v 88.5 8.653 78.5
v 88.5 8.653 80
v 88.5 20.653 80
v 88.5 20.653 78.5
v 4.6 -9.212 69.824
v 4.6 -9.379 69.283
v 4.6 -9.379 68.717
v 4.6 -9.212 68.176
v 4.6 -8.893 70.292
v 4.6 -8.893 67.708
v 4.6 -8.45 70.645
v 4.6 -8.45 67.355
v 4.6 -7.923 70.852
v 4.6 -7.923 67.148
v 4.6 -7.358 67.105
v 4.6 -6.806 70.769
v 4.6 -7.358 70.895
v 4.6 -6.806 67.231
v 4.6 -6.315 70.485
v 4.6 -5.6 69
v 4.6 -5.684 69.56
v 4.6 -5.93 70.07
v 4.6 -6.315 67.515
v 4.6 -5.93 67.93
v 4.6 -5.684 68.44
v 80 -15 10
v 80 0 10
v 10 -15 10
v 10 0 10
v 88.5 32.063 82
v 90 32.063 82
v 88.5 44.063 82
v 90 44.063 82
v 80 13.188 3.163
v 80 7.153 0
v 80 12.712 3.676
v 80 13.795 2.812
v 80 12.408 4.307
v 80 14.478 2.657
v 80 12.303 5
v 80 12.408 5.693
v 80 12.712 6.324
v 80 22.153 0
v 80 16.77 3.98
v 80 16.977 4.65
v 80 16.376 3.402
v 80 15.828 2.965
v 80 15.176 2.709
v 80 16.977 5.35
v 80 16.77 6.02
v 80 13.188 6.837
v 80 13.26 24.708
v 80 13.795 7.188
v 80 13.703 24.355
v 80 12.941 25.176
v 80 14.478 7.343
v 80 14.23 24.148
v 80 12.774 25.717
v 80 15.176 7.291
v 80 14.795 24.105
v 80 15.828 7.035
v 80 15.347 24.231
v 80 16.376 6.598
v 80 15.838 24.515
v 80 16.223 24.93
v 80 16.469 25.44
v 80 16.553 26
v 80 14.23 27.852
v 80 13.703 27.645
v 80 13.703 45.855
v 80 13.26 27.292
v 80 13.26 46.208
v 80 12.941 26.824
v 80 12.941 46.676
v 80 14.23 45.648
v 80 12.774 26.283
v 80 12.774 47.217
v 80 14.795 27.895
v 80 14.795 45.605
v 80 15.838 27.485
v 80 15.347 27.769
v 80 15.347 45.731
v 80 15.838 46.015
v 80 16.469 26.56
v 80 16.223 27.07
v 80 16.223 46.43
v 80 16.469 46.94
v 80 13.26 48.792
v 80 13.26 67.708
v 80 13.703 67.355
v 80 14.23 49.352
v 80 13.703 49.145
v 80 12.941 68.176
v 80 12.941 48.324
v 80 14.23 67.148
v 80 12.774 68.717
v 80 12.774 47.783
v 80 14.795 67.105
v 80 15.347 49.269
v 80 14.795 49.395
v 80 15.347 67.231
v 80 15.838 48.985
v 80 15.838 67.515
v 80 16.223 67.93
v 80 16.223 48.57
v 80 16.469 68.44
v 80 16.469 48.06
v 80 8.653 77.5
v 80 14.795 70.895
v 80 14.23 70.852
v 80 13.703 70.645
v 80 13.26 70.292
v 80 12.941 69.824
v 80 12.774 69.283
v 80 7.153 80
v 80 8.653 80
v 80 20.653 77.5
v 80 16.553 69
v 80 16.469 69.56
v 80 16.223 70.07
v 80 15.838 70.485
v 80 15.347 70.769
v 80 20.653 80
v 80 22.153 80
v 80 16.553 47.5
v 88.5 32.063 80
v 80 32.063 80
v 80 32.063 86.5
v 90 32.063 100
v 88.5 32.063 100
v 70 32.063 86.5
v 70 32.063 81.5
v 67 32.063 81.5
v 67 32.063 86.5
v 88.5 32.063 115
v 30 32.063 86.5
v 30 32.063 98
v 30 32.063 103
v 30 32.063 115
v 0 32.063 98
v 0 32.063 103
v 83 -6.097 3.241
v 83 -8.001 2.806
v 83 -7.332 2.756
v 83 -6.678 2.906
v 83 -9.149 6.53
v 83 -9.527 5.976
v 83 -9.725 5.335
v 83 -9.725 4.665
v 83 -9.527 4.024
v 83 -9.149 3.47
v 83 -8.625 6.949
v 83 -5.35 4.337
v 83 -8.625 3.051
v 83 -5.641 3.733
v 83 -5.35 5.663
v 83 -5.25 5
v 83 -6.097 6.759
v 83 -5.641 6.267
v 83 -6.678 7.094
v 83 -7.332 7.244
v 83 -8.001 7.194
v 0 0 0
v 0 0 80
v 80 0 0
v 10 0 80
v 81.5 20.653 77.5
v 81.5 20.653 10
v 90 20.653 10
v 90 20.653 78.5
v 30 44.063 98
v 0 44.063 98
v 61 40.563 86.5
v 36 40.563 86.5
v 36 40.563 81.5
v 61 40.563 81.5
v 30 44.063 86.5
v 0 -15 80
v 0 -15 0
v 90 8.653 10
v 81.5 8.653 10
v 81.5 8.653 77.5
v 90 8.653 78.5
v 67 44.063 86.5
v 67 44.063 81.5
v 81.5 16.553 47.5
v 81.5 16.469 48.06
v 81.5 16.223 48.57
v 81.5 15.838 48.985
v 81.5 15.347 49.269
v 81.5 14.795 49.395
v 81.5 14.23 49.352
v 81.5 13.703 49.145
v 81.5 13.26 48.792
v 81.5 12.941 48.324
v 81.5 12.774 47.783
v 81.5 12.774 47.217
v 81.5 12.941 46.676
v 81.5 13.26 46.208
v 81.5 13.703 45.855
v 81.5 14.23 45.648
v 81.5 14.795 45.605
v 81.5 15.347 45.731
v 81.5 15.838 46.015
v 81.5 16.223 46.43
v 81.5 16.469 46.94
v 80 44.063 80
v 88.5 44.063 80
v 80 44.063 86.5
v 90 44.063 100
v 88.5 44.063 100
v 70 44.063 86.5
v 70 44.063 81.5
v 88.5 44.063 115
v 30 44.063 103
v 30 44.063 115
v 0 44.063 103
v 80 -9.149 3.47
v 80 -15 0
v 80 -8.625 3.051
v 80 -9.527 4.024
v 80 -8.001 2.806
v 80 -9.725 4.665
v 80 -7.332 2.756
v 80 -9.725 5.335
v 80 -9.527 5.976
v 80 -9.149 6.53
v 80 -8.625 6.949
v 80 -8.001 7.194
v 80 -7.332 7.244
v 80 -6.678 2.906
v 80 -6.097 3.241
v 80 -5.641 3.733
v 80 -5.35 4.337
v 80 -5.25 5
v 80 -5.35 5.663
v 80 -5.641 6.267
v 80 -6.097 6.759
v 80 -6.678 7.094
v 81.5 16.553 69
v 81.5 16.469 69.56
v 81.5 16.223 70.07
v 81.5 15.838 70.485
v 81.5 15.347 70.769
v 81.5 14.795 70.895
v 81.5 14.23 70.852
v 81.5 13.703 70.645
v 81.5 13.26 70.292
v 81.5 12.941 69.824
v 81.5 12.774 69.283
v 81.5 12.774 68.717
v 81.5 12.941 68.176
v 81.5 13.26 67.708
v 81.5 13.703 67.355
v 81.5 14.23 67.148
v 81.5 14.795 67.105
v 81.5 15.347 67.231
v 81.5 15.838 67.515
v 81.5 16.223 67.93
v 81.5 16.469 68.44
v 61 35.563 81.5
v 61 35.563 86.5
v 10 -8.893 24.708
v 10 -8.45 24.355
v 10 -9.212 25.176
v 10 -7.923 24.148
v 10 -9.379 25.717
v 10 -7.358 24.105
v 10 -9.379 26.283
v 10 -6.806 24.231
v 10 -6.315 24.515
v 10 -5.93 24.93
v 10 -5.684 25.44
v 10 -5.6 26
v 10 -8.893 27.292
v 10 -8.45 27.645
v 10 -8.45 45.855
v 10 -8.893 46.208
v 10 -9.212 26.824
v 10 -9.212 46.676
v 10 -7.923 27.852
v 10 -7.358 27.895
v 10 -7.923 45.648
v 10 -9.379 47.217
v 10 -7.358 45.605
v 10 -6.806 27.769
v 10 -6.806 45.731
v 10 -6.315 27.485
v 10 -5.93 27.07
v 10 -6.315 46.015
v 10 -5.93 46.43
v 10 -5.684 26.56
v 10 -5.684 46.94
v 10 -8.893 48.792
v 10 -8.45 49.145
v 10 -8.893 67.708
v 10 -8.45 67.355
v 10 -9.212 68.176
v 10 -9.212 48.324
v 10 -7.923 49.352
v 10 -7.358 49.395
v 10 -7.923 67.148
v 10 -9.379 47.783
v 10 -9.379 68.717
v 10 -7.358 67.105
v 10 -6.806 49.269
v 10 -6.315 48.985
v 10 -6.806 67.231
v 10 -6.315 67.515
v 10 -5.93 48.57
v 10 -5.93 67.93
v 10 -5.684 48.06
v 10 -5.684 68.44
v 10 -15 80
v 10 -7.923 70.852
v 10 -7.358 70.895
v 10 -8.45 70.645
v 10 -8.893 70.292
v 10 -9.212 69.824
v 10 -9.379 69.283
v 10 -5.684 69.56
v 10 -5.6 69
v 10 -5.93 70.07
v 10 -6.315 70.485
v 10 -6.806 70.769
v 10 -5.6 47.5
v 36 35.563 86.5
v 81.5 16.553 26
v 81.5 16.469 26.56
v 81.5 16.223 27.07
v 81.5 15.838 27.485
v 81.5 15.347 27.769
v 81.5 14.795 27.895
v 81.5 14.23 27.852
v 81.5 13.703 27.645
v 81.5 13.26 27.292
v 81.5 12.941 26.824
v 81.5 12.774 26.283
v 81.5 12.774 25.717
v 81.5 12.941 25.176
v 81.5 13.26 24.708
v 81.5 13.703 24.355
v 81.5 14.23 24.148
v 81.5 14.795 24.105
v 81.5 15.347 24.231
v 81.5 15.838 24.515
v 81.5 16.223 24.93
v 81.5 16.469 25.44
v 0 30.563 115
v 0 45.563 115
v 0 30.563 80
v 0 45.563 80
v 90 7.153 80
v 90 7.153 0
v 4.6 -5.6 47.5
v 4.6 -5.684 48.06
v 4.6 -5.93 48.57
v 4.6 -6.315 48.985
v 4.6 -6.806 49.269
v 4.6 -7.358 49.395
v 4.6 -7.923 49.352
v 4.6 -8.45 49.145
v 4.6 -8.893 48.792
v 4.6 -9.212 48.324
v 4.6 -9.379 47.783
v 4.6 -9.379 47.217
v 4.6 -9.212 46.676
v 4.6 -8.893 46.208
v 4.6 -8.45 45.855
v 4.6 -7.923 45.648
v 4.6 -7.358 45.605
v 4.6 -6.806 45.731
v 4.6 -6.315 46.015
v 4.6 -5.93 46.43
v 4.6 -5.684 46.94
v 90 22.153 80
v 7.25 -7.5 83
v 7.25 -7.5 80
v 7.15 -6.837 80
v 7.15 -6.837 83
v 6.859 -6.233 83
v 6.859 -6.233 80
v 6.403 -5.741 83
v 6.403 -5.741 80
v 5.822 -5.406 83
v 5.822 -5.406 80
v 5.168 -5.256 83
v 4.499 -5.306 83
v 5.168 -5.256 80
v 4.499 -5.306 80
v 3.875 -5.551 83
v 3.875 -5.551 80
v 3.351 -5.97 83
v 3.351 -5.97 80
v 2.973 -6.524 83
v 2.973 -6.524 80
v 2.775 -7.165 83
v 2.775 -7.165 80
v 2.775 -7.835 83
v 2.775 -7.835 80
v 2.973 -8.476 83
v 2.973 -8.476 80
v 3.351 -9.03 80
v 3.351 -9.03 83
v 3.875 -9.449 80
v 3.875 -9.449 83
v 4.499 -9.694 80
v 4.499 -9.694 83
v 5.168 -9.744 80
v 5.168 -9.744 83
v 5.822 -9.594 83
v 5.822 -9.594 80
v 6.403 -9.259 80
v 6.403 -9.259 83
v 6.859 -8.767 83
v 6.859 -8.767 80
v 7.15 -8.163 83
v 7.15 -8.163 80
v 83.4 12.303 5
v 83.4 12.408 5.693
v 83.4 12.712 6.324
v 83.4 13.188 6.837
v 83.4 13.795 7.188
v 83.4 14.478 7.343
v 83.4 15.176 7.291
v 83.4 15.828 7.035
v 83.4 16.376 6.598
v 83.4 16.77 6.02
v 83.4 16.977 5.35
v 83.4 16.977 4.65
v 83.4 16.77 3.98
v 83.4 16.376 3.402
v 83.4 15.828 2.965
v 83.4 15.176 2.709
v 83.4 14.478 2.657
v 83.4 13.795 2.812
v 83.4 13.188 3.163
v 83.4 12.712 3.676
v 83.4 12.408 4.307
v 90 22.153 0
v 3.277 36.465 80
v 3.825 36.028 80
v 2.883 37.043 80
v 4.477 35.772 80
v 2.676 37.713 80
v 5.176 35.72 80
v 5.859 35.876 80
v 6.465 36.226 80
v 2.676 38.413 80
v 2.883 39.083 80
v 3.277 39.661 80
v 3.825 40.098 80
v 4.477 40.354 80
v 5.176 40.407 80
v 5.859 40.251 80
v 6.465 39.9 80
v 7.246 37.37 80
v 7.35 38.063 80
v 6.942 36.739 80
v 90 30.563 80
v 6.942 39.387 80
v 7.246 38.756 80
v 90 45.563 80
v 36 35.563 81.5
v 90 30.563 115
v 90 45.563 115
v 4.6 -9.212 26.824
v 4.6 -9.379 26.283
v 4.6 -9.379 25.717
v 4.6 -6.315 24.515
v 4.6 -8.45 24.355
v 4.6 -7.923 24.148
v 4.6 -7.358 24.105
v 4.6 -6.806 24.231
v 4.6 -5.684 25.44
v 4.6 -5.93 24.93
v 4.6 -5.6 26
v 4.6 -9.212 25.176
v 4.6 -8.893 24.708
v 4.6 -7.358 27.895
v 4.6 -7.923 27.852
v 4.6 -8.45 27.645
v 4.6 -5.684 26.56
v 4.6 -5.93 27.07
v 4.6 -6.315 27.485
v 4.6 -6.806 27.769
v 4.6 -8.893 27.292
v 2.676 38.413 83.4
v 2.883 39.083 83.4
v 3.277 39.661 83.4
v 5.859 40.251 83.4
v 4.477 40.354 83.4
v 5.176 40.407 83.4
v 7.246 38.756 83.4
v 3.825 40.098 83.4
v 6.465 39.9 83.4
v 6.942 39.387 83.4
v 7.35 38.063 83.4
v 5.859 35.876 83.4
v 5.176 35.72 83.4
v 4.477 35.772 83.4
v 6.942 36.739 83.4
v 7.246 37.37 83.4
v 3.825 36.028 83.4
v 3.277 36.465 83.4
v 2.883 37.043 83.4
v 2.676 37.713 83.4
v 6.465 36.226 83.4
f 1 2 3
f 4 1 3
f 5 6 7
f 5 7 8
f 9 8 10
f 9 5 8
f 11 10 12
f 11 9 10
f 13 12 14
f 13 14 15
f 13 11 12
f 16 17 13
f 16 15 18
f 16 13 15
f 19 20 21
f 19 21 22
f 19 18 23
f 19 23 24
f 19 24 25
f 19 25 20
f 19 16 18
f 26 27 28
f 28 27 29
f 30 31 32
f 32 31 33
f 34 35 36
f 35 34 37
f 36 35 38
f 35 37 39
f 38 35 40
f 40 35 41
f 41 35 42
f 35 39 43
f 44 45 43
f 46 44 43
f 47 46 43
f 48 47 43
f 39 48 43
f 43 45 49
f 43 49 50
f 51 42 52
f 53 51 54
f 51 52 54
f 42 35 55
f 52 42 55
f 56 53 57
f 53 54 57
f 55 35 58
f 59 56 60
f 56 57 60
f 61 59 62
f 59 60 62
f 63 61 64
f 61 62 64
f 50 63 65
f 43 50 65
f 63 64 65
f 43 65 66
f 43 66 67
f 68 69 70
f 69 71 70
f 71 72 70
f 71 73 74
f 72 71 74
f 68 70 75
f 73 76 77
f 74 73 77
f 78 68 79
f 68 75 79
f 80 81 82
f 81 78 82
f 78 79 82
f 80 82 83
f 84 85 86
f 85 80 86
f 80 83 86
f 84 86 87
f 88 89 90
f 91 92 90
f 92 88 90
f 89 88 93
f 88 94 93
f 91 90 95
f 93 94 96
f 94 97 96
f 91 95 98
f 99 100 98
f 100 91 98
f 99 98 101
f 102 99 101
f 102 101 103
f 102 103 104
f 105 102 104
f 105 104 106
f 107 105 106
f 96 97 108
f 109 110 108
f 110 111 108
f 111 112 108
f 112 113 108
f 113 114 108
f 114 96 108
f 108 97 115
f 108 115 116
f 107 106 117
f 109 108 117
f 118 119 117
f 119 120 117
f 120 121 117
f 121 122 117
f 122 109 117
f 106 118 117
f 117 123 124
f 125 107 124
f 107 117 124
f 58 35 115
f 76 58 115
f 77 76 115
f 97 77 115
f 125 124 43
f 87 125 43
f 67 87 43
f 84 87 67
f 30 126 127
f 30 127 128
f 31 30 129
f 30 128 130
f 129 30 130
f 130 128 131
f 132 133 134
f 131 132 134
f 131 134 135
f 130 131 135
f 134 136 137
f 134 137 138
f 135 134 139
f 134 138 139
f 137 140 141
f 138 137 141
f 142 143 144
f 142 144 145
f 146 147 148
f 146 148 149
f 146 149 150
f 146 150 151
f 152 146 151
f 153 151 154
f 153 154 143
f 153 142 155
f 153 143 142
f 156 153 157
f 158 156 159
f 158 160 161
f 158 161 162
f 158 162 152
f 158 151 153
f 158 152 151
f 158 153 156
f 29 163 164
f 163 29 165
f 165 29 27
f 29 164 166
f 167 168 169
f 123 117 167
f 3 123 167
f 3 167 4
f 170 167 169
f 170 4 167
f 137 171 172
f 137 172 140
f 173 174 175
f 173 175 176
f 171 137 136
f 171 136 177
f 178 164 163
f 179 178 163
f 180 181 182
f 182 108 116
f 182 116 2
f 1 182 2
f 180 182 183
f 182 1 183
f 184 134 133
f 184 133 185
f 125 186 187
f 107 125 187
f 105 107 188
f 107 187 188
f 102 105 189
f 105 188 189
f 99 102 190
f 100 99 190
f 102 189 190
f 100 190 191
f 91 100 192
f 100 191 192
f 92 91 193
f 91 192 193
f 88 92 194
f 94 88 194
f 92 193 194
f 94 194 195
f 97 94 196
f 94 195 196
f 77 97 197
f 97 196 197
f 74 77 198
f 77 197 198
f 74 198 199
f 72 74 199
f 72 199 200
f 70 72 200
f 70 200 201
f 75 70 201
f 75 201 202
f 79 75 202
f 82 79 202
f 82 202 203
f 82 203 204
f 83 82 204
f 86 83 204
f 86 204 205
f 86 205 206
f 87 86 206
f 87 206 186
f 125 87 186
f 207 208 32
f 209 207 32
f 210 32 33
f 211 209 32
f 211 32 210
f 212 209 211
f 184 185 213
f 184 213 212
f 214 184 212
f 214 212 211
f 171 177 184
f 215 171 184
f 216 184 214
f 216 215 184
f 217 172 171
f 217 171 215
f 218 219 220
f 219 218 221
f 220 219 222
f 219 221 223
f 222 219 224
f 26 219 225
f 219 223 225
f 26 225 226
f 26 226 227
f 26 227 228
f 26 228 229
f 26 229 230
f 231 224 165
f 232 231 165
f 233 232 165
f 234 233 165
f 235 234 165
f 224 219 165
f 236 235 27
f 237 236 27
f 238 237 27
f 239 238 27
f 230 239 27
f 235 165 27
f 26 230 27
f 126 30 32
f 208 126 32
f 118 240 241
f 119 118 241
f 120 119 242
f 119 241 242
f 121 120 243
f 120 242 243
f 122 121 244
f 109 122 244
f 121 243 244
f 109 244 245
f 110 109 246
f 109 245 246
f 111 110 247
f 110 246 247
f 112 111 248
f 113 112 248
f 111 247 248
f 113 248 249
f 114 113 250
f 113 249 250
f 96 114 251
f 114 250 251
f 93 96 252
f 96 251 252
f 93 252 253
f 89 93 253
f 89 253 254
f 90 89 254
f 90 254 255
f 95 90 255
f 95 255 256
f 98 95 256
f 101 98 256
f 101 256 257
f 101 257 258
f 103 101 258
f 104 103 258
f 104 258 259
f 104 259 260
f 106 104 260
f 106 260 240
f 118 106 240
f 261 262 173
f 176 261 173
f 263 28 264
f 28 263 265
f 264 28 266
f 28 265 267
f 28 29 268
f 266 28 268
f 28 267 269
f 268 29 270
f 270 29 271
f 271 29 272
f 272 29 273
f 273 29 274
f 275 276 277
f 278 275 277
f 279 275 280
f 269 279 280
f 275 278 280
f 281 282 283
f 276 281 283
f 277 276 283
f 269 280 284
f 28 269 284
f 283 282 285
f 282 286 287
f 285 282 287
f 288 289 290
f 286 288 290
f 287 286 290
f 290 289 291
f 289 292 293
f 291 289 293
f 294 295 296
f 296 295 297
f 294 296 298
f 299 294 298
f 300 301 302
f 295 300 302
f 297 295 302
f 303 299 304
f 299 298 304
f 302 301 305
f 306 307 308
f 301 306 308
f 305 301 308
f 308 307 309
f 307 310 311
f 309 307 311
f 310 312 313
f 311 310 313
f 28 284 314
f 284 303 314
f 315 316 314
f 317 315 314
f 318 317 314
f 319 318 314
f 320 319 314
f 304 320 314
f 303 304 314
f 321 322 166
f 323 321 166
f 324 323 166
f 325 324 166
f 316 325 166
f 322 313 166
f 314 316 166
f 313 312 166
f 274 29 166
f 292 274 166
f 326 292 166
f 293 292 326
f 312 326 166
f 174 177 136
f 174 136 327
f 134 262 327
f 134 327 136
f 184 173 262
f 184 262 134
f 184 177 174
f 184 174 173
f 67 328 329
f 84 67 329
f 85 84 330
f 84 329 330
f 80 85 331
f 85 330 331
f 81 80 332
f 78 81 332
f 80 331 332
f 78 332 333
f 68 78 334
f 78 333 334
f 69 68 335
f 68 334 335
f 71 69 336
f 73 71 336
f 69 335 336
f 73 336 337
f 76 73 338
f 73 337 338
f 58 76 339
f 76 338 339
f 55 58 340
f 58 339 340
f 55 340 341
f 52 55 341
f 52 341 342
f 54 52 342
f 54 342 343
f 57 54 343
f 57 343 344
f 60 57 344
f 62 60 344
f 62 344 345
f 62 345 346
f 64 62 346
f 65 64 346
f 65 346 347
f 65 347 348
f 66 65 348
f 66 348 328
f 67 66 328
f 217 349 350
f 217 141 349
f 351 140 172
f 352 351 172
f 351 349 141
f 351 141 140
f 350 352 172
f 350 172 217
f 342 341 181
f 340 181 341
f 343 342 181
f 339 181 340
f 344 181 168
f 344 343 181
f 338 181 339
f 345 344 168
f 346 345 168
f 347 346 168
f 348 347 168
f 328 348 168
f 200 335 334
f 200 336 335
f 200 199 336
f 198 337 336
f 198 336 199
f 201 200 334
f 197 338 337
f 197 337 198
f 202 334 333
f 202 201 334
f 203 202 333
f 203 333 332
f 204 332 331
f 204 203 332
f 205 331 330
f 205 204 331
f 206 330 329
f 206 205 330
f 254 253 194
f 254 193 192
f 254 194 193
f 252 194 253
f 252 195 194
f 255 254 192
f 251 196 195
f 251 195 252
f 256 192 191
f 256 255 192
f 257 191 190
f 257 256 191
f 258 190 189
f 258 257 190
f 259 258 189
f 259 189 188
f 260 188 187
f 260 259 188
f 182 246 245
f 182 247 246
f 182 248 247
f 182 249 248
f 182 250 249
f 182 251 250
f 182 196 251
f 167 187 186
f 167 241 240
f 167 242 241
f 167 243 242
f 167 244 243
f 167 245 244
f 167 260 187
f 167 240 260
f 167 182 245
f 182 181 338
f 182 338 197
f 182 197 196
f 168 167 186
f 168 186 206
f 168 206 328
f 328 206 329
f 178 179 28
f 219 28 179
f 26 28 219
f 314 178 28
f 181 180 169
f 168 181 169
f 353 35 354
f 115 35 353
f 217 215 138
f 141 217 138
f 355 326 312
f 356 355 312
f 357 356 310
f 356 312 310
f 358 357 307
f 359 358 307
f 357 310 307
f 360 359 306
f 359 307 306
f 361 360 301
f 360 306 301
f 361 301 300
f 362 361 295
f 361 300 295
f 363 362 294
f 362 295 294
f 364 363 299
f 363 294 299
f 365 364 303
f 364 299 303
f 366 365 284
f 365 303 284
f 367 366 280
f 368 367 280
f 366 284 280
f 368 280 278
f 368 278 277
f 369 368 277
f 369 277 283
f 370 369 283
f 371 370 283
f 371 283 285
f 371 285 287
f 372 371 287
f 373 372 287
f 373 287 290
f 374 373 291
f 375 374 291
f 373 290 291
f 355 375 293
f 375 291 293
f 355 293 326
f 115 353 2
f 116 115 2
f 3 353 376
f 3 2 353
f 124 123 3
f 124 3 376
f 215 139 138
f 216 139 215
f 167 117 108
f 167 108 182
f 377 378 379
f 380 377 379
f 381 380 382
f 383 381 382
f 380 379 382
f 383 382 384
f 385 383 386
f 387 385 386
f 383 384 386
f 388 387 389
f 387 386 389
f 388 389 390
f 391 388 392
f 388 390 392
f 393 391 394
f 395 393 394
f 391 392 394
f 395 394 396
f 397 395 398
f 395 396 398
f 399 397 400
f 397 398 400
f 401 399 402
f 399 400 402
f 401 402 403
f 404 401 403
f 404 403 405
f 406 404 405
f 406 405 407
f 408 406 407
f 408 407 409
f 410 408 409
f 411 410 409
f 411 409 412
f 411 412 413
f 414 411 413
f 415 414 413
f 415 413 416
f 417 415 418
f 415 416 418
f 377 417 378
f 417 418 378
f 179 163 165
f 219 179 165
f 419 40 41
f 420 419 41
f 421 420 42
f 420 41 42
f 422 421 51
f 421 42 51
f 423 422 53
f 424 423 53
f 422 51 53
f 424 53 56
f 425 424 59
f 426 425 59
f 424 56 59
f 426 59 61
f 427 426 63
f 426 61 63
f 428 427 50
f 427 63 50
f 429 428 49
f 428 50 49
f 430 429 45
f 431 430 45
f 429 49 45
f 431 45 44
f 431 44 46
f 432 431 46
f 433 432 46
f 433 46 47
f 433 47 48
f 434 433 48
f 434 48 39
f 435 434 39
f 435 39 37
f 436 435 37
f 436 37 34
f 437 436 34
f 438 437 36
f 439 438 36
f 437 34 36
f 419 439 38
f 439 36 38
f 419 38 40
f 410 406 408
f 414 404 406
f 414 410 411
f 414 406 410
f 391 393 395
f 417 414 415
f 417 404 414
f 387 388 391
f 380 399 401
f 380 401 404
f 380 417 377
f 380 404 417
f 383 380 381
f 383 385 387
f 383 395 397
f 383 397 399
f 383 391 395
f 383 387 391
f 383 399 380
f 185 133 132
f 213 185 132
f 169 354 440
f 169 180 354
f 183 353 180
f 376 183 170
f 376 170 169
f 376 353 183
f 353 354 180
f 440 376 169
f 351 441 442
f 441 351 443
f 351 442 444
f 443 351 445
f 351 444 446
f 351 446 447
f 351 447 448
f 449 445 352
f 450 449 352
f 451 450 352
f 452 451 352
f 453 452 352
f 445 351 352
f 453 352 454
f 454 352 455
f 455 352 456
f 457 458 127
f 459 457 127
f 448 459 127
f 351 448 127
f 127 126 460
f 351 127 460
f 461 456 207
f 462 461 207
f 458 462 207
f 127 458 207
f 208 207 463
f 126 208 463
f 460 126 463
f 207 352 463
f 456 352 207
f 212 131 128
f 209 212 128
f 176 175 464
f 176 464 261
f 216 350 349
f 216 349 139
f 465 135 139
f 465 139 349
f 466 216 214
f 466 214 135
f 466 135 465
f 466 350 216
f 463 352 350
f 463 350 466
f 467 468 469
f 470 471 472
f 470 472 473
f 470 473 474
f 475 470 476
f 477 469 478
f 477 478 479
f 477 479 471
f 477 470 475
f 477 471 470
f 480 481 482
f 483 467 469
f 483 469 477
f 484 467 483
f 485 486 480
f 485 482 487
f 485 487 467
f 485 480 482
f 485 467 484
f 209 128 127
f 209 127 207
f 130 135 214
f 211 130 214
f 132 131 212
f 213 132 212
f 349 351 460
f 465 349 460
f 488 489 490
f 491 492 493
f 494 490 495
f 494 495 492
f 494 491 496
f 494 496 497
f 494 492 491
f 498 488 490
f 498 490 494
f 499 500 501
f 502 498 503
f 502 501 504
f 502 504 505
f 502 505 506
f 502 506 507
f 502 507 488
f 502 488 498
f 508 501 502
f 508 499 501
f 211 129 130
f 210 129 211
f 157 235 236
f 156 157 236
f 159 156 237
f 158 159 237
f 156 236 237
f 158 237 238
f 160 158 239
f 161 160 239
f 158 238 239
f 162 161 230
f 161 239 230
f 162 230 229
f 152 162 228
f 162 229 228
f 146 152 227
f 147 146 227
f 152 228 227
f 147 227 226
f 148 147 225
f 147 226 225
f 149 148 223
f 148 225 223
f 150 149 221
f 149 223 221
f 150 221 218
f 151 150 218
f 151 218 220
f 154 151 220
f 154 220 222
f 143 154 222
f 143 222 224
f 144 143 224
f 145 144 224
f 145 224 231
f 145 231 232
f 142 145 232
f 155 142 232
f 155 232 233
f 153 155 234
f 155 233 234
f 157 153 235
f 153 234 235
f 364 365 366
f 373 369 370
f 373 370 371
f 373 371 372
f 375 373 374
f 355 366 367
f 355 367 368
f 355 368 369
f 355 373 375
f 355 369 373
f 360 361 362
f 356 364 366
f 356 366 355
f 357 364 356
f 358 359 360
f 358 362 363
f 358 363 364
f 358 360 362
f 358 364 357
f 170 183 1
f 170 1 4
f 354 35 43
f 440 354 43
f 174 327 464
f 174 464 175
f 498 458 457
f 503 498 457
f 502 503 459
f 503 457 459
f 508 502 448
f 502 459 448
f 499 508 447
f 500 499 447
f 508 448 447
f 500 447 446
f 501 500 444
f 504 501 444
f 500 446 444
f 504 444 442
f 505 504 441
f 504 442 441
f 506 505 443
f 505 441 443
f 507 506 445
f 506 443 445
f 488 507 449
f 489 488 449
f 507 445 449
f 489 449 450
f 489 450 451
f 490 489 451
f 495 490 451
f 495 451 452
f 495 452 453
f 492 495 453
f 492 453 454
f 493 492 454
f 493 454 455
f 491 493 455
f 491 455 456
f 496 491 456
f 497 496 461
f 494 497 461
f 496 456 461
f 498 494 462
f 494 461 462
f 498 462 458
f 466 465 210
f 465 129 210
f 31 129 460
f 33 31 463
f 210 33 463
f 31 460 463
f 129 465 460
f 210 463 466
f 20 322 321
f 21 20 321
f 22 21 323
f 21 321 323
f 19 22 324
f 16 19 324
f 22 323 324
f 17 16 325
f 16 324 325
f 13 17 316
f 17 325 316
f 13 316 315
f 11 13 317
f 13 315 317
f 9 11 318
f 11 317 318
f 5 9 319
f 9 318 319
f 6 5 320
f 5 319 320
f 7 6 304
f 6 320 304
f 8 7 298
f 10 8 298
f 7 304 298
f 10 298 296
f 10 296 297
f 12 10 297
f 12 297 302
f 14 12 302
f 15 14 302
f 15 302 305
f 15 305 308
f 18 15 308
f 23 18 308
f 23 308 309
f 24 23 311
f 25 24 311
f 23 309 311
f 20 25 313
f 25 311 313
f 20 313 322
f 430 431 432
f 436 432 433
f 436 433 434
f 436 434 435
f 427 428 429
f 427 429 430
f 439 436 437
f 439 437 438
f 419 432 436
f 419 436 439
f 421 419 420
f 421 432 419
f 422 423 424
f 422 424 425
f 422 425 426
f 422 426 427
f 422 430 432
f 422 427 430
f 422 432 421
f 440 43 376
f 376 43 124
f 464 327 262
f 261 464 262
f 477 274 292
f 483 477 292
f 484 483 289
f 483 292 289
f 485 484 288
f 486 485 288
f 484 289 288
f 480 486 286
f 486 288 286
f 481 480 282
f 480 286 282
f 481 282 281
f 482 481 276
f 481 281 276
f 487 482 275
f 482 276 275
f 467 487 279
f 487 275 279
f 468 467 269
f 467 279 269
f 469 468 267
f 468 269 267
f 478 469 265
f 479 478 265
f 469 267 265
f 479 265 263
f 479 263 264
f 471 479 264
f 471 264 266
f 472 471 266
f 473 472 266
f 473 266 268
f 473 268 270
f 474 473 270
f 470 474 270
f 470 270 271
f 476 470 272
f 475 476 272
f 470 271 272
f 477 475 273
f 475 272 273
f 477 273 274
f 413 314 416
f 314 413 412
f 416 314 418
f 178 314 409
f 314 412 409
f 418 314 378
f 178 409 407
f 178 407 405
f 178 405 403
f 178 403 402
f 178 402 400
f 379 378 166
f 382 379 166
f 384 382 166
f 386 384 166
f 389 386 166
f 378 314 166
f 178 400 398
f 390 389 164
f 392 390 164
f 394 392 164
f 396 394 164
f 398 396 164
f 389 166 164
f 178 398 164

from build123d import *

# Parameters (mm, degrees)
F1_DEPTH  = 15
F2_R      = 1.9
F3_DEPTH  = 5.4
F4_R      = 2.25
F5_DEPTH  = 3
F6_R      = 2.25
F7_DEPTH  = 3
F8_W      = 90
F8_H      = 15
F9_DEPTH  = 35
F11_R     = 2.35
F12_DEPTH = 3.4
F10_W     = 8.5
F10_H     = 12
F13_DEPTH = 115.001
F10_W_2   = 10
F10_W_3   = 37
F14_DEPTH = 28.5
F10_W_4   = 3
F15_DEPTH = 33.5
F16_W     = 15
F16_H     = 80
F17_DEPTH = 10
F18_W     = 12
F18_H     = 68.5
F19_DEPTH = 8.5
F20_W     = 8.5
F20_H     = 12
F21_DEPTH = 2.5
F22_R     = 1.9
F23_DEPTH = 81.501
F24_R     = 2.35
F25_DEPTH = 3.4
F26_W     = 25
F26_H     = 5
F27_DEPTH = 5
F28_W     = 12
F28_H     = 5
F29_DEPTH = 50
F30_W     = 12
F30_H     = 18
F31_DEPTH = 2


with BuildPart() as f1:
    # F0 (on Front) → F1 (new body)
    with BuildSketch(Plane.XZ):
        Polygon((0, 80), (0, 0), (80, 0), (80, 10), (10, 10), (10, 80), align=None)
    extrude(amount=F1_DEPTH)

    # F2 (on face) → F3 (cut)
    with BuildSketch(Plane.YZ.offset(10)):
        with Locations((-7.5, 26)):
            Circle(F2_R)
        with Locations((-7.5, 47.5)):
            Circle(F2_R)
        with Locations((-7.5, 69)):
            Circle(F2_R)
    extrude(amount=-F3_DEPTH, mode=Mode.SUBTRACT)

    # F4 (on face) → F5 (join)
    with BuildSketch(Plane.YZ.offset(80)):
        with Locations((-7.5, 5)):
            Circle(F4_R)
    extrude(amount=F5_DEPTH)

    # F6 (on face) → F7 (join)
    with BuildSketch(Plane.XY.offset(80)):
        with Locations((5, -7.5)):
            Circle(F6_R)
    extrude(amount=F7_DEPTH)


with BuildPart() as f9:
    # F8 (on face) → F9 (new body)
    with BuildSketch(Plane.XY.offset(80)):
        with Locations((45, 38.063085)):
            Rectangle(F8_W, F8_H)
    extrude(amount=F9_DEPTH)

    # F11 (on face) → F12 (cut)
    with BuildSketch(Plane(origin=(0, 0, 80), x_dir=(1, 0, 0), z_dir=(0, 0, -1))):
        with Locations((5, -38.063085)):
            Circle(F11_R)
    extrude(amount=-F12_DEPTH, mode=Mode.SUBTRACT)

    # F10 (on face) → F13 (cut, through all)
    with BuildSketch(Plane.XY.offset(115)):
        with Locations((84.25, 38.063085)):
            Rectangle(F10_W, F10_H)
    extrude(amount=-F13_DEPTH, mode=Mode.SUBTRACT)

    # F10 (on face) → F14 (cut)
    with BuildSketch(Plane.XY.offset(115)):
        with Locations((75, 38.063085)):
            Rectangle(F10_W_2, F10_H)
        with Locations((48.5, 38.063085)):
            Rectangle(F10_W_3, F10_H)
    extrude(amount=-F14_DEPTH, mode=Mode.SUBTRACT)

    # F10 (on face) → F15 (cut)
    with BuildSketch(Plane.XY.offset(115)):
        with Locations((68.5, 38.063085)):
            Rectangle(F10_W_4, F10_H)
    extrude(amount=-F15_DEPTH, mode=Mode.SUBTRACT)

    # F26 (on face) → F27 (cut)
    with BuildSketch(Plane.XY.offset(86.5)):
        with Locations((48.5, 38.063085)):
            Rectangle(F26_W, F26_H)
    extrude(amount=-F27_DEPTH, mode=Mode.SUBTRACT)

    # F28 (on face) → F29 (cut)
    with BuildSketch(Plane(origin=(0, 0, 0), x_dir=(0, -1, 0), z_dir=(-1, 0, 0))):
        with Locations((-38.063085, 100.5)):
            Rectangle(F28_W, F28_H)
    extrude(amount=-F29_DEPTH, mode=Mode.SUBTRACT)

    # F30 (on face) → F31 (cut)
    with BuildSketch(Plane.YZ.offset(90)):
        with Locations((38.063085, 91)):
            Rectangle(F30_W, F30_H)
    extrude(amount=-F31_DEPTH, mode=Mode.SUBTRACT)


with BuildPart() as f17:
    # F16 (on face) → F17 (new body)
    with BuildSketch(Plane.YZ.offset(80)):
        with Locations((14.653222, 40)):
            Rectangle(F16_W, F16_H)
    extrude(amount=F17_DEPTH)

    # F18 (on face) → F19 (cut)
    with BuildSketch(Plane.YZ.offset(90)):
        with Locations((14.653222, 44.25)):
            Rectangle(F18_W, F18_H)
    extrude(amount=-F19_DEPTH, mode=Mode.SUBTRACT)

    # F20 (on face) → F21 (cut)
    with BuildSketch(Plane.XY.offset(80)):
        with Locations((84.25, 14.653222)):
            Rectangle(F20_W, F20_H)
    extrude(amount=-F21_DEPTH, mode=Mode.SUBTRACT)

    # F22 (on face) → F23 (cut, through all)
    with BuildSketch(Plane.YZ.offset(81.5)):
        with Locations((14.653222, 69)):
            Circle(F22_R)
        with Locations((14.653222, 47.5)):
            Circle(F22_R)
        with Locations((14.653222, 26)):
            Circle(F22_R)
    extrude(amount=-F23_DEPTH, mode=Mode.SUBTRACT)

    # F24 (on face) → F25 (cut)
    with BuildSketch(Plane(origin=(80, 0, 0), x_dir=(0, -1, 0), z_dir=(-1, 0, 0))):
        with Locations((-14.653222, 5)):
            Circle(F24_R)
    extrude(amount=-F25_DEPTH, mode=Mode.SUBTRACT)


solid = Compound([f1.part, f9.part, f17.part])
